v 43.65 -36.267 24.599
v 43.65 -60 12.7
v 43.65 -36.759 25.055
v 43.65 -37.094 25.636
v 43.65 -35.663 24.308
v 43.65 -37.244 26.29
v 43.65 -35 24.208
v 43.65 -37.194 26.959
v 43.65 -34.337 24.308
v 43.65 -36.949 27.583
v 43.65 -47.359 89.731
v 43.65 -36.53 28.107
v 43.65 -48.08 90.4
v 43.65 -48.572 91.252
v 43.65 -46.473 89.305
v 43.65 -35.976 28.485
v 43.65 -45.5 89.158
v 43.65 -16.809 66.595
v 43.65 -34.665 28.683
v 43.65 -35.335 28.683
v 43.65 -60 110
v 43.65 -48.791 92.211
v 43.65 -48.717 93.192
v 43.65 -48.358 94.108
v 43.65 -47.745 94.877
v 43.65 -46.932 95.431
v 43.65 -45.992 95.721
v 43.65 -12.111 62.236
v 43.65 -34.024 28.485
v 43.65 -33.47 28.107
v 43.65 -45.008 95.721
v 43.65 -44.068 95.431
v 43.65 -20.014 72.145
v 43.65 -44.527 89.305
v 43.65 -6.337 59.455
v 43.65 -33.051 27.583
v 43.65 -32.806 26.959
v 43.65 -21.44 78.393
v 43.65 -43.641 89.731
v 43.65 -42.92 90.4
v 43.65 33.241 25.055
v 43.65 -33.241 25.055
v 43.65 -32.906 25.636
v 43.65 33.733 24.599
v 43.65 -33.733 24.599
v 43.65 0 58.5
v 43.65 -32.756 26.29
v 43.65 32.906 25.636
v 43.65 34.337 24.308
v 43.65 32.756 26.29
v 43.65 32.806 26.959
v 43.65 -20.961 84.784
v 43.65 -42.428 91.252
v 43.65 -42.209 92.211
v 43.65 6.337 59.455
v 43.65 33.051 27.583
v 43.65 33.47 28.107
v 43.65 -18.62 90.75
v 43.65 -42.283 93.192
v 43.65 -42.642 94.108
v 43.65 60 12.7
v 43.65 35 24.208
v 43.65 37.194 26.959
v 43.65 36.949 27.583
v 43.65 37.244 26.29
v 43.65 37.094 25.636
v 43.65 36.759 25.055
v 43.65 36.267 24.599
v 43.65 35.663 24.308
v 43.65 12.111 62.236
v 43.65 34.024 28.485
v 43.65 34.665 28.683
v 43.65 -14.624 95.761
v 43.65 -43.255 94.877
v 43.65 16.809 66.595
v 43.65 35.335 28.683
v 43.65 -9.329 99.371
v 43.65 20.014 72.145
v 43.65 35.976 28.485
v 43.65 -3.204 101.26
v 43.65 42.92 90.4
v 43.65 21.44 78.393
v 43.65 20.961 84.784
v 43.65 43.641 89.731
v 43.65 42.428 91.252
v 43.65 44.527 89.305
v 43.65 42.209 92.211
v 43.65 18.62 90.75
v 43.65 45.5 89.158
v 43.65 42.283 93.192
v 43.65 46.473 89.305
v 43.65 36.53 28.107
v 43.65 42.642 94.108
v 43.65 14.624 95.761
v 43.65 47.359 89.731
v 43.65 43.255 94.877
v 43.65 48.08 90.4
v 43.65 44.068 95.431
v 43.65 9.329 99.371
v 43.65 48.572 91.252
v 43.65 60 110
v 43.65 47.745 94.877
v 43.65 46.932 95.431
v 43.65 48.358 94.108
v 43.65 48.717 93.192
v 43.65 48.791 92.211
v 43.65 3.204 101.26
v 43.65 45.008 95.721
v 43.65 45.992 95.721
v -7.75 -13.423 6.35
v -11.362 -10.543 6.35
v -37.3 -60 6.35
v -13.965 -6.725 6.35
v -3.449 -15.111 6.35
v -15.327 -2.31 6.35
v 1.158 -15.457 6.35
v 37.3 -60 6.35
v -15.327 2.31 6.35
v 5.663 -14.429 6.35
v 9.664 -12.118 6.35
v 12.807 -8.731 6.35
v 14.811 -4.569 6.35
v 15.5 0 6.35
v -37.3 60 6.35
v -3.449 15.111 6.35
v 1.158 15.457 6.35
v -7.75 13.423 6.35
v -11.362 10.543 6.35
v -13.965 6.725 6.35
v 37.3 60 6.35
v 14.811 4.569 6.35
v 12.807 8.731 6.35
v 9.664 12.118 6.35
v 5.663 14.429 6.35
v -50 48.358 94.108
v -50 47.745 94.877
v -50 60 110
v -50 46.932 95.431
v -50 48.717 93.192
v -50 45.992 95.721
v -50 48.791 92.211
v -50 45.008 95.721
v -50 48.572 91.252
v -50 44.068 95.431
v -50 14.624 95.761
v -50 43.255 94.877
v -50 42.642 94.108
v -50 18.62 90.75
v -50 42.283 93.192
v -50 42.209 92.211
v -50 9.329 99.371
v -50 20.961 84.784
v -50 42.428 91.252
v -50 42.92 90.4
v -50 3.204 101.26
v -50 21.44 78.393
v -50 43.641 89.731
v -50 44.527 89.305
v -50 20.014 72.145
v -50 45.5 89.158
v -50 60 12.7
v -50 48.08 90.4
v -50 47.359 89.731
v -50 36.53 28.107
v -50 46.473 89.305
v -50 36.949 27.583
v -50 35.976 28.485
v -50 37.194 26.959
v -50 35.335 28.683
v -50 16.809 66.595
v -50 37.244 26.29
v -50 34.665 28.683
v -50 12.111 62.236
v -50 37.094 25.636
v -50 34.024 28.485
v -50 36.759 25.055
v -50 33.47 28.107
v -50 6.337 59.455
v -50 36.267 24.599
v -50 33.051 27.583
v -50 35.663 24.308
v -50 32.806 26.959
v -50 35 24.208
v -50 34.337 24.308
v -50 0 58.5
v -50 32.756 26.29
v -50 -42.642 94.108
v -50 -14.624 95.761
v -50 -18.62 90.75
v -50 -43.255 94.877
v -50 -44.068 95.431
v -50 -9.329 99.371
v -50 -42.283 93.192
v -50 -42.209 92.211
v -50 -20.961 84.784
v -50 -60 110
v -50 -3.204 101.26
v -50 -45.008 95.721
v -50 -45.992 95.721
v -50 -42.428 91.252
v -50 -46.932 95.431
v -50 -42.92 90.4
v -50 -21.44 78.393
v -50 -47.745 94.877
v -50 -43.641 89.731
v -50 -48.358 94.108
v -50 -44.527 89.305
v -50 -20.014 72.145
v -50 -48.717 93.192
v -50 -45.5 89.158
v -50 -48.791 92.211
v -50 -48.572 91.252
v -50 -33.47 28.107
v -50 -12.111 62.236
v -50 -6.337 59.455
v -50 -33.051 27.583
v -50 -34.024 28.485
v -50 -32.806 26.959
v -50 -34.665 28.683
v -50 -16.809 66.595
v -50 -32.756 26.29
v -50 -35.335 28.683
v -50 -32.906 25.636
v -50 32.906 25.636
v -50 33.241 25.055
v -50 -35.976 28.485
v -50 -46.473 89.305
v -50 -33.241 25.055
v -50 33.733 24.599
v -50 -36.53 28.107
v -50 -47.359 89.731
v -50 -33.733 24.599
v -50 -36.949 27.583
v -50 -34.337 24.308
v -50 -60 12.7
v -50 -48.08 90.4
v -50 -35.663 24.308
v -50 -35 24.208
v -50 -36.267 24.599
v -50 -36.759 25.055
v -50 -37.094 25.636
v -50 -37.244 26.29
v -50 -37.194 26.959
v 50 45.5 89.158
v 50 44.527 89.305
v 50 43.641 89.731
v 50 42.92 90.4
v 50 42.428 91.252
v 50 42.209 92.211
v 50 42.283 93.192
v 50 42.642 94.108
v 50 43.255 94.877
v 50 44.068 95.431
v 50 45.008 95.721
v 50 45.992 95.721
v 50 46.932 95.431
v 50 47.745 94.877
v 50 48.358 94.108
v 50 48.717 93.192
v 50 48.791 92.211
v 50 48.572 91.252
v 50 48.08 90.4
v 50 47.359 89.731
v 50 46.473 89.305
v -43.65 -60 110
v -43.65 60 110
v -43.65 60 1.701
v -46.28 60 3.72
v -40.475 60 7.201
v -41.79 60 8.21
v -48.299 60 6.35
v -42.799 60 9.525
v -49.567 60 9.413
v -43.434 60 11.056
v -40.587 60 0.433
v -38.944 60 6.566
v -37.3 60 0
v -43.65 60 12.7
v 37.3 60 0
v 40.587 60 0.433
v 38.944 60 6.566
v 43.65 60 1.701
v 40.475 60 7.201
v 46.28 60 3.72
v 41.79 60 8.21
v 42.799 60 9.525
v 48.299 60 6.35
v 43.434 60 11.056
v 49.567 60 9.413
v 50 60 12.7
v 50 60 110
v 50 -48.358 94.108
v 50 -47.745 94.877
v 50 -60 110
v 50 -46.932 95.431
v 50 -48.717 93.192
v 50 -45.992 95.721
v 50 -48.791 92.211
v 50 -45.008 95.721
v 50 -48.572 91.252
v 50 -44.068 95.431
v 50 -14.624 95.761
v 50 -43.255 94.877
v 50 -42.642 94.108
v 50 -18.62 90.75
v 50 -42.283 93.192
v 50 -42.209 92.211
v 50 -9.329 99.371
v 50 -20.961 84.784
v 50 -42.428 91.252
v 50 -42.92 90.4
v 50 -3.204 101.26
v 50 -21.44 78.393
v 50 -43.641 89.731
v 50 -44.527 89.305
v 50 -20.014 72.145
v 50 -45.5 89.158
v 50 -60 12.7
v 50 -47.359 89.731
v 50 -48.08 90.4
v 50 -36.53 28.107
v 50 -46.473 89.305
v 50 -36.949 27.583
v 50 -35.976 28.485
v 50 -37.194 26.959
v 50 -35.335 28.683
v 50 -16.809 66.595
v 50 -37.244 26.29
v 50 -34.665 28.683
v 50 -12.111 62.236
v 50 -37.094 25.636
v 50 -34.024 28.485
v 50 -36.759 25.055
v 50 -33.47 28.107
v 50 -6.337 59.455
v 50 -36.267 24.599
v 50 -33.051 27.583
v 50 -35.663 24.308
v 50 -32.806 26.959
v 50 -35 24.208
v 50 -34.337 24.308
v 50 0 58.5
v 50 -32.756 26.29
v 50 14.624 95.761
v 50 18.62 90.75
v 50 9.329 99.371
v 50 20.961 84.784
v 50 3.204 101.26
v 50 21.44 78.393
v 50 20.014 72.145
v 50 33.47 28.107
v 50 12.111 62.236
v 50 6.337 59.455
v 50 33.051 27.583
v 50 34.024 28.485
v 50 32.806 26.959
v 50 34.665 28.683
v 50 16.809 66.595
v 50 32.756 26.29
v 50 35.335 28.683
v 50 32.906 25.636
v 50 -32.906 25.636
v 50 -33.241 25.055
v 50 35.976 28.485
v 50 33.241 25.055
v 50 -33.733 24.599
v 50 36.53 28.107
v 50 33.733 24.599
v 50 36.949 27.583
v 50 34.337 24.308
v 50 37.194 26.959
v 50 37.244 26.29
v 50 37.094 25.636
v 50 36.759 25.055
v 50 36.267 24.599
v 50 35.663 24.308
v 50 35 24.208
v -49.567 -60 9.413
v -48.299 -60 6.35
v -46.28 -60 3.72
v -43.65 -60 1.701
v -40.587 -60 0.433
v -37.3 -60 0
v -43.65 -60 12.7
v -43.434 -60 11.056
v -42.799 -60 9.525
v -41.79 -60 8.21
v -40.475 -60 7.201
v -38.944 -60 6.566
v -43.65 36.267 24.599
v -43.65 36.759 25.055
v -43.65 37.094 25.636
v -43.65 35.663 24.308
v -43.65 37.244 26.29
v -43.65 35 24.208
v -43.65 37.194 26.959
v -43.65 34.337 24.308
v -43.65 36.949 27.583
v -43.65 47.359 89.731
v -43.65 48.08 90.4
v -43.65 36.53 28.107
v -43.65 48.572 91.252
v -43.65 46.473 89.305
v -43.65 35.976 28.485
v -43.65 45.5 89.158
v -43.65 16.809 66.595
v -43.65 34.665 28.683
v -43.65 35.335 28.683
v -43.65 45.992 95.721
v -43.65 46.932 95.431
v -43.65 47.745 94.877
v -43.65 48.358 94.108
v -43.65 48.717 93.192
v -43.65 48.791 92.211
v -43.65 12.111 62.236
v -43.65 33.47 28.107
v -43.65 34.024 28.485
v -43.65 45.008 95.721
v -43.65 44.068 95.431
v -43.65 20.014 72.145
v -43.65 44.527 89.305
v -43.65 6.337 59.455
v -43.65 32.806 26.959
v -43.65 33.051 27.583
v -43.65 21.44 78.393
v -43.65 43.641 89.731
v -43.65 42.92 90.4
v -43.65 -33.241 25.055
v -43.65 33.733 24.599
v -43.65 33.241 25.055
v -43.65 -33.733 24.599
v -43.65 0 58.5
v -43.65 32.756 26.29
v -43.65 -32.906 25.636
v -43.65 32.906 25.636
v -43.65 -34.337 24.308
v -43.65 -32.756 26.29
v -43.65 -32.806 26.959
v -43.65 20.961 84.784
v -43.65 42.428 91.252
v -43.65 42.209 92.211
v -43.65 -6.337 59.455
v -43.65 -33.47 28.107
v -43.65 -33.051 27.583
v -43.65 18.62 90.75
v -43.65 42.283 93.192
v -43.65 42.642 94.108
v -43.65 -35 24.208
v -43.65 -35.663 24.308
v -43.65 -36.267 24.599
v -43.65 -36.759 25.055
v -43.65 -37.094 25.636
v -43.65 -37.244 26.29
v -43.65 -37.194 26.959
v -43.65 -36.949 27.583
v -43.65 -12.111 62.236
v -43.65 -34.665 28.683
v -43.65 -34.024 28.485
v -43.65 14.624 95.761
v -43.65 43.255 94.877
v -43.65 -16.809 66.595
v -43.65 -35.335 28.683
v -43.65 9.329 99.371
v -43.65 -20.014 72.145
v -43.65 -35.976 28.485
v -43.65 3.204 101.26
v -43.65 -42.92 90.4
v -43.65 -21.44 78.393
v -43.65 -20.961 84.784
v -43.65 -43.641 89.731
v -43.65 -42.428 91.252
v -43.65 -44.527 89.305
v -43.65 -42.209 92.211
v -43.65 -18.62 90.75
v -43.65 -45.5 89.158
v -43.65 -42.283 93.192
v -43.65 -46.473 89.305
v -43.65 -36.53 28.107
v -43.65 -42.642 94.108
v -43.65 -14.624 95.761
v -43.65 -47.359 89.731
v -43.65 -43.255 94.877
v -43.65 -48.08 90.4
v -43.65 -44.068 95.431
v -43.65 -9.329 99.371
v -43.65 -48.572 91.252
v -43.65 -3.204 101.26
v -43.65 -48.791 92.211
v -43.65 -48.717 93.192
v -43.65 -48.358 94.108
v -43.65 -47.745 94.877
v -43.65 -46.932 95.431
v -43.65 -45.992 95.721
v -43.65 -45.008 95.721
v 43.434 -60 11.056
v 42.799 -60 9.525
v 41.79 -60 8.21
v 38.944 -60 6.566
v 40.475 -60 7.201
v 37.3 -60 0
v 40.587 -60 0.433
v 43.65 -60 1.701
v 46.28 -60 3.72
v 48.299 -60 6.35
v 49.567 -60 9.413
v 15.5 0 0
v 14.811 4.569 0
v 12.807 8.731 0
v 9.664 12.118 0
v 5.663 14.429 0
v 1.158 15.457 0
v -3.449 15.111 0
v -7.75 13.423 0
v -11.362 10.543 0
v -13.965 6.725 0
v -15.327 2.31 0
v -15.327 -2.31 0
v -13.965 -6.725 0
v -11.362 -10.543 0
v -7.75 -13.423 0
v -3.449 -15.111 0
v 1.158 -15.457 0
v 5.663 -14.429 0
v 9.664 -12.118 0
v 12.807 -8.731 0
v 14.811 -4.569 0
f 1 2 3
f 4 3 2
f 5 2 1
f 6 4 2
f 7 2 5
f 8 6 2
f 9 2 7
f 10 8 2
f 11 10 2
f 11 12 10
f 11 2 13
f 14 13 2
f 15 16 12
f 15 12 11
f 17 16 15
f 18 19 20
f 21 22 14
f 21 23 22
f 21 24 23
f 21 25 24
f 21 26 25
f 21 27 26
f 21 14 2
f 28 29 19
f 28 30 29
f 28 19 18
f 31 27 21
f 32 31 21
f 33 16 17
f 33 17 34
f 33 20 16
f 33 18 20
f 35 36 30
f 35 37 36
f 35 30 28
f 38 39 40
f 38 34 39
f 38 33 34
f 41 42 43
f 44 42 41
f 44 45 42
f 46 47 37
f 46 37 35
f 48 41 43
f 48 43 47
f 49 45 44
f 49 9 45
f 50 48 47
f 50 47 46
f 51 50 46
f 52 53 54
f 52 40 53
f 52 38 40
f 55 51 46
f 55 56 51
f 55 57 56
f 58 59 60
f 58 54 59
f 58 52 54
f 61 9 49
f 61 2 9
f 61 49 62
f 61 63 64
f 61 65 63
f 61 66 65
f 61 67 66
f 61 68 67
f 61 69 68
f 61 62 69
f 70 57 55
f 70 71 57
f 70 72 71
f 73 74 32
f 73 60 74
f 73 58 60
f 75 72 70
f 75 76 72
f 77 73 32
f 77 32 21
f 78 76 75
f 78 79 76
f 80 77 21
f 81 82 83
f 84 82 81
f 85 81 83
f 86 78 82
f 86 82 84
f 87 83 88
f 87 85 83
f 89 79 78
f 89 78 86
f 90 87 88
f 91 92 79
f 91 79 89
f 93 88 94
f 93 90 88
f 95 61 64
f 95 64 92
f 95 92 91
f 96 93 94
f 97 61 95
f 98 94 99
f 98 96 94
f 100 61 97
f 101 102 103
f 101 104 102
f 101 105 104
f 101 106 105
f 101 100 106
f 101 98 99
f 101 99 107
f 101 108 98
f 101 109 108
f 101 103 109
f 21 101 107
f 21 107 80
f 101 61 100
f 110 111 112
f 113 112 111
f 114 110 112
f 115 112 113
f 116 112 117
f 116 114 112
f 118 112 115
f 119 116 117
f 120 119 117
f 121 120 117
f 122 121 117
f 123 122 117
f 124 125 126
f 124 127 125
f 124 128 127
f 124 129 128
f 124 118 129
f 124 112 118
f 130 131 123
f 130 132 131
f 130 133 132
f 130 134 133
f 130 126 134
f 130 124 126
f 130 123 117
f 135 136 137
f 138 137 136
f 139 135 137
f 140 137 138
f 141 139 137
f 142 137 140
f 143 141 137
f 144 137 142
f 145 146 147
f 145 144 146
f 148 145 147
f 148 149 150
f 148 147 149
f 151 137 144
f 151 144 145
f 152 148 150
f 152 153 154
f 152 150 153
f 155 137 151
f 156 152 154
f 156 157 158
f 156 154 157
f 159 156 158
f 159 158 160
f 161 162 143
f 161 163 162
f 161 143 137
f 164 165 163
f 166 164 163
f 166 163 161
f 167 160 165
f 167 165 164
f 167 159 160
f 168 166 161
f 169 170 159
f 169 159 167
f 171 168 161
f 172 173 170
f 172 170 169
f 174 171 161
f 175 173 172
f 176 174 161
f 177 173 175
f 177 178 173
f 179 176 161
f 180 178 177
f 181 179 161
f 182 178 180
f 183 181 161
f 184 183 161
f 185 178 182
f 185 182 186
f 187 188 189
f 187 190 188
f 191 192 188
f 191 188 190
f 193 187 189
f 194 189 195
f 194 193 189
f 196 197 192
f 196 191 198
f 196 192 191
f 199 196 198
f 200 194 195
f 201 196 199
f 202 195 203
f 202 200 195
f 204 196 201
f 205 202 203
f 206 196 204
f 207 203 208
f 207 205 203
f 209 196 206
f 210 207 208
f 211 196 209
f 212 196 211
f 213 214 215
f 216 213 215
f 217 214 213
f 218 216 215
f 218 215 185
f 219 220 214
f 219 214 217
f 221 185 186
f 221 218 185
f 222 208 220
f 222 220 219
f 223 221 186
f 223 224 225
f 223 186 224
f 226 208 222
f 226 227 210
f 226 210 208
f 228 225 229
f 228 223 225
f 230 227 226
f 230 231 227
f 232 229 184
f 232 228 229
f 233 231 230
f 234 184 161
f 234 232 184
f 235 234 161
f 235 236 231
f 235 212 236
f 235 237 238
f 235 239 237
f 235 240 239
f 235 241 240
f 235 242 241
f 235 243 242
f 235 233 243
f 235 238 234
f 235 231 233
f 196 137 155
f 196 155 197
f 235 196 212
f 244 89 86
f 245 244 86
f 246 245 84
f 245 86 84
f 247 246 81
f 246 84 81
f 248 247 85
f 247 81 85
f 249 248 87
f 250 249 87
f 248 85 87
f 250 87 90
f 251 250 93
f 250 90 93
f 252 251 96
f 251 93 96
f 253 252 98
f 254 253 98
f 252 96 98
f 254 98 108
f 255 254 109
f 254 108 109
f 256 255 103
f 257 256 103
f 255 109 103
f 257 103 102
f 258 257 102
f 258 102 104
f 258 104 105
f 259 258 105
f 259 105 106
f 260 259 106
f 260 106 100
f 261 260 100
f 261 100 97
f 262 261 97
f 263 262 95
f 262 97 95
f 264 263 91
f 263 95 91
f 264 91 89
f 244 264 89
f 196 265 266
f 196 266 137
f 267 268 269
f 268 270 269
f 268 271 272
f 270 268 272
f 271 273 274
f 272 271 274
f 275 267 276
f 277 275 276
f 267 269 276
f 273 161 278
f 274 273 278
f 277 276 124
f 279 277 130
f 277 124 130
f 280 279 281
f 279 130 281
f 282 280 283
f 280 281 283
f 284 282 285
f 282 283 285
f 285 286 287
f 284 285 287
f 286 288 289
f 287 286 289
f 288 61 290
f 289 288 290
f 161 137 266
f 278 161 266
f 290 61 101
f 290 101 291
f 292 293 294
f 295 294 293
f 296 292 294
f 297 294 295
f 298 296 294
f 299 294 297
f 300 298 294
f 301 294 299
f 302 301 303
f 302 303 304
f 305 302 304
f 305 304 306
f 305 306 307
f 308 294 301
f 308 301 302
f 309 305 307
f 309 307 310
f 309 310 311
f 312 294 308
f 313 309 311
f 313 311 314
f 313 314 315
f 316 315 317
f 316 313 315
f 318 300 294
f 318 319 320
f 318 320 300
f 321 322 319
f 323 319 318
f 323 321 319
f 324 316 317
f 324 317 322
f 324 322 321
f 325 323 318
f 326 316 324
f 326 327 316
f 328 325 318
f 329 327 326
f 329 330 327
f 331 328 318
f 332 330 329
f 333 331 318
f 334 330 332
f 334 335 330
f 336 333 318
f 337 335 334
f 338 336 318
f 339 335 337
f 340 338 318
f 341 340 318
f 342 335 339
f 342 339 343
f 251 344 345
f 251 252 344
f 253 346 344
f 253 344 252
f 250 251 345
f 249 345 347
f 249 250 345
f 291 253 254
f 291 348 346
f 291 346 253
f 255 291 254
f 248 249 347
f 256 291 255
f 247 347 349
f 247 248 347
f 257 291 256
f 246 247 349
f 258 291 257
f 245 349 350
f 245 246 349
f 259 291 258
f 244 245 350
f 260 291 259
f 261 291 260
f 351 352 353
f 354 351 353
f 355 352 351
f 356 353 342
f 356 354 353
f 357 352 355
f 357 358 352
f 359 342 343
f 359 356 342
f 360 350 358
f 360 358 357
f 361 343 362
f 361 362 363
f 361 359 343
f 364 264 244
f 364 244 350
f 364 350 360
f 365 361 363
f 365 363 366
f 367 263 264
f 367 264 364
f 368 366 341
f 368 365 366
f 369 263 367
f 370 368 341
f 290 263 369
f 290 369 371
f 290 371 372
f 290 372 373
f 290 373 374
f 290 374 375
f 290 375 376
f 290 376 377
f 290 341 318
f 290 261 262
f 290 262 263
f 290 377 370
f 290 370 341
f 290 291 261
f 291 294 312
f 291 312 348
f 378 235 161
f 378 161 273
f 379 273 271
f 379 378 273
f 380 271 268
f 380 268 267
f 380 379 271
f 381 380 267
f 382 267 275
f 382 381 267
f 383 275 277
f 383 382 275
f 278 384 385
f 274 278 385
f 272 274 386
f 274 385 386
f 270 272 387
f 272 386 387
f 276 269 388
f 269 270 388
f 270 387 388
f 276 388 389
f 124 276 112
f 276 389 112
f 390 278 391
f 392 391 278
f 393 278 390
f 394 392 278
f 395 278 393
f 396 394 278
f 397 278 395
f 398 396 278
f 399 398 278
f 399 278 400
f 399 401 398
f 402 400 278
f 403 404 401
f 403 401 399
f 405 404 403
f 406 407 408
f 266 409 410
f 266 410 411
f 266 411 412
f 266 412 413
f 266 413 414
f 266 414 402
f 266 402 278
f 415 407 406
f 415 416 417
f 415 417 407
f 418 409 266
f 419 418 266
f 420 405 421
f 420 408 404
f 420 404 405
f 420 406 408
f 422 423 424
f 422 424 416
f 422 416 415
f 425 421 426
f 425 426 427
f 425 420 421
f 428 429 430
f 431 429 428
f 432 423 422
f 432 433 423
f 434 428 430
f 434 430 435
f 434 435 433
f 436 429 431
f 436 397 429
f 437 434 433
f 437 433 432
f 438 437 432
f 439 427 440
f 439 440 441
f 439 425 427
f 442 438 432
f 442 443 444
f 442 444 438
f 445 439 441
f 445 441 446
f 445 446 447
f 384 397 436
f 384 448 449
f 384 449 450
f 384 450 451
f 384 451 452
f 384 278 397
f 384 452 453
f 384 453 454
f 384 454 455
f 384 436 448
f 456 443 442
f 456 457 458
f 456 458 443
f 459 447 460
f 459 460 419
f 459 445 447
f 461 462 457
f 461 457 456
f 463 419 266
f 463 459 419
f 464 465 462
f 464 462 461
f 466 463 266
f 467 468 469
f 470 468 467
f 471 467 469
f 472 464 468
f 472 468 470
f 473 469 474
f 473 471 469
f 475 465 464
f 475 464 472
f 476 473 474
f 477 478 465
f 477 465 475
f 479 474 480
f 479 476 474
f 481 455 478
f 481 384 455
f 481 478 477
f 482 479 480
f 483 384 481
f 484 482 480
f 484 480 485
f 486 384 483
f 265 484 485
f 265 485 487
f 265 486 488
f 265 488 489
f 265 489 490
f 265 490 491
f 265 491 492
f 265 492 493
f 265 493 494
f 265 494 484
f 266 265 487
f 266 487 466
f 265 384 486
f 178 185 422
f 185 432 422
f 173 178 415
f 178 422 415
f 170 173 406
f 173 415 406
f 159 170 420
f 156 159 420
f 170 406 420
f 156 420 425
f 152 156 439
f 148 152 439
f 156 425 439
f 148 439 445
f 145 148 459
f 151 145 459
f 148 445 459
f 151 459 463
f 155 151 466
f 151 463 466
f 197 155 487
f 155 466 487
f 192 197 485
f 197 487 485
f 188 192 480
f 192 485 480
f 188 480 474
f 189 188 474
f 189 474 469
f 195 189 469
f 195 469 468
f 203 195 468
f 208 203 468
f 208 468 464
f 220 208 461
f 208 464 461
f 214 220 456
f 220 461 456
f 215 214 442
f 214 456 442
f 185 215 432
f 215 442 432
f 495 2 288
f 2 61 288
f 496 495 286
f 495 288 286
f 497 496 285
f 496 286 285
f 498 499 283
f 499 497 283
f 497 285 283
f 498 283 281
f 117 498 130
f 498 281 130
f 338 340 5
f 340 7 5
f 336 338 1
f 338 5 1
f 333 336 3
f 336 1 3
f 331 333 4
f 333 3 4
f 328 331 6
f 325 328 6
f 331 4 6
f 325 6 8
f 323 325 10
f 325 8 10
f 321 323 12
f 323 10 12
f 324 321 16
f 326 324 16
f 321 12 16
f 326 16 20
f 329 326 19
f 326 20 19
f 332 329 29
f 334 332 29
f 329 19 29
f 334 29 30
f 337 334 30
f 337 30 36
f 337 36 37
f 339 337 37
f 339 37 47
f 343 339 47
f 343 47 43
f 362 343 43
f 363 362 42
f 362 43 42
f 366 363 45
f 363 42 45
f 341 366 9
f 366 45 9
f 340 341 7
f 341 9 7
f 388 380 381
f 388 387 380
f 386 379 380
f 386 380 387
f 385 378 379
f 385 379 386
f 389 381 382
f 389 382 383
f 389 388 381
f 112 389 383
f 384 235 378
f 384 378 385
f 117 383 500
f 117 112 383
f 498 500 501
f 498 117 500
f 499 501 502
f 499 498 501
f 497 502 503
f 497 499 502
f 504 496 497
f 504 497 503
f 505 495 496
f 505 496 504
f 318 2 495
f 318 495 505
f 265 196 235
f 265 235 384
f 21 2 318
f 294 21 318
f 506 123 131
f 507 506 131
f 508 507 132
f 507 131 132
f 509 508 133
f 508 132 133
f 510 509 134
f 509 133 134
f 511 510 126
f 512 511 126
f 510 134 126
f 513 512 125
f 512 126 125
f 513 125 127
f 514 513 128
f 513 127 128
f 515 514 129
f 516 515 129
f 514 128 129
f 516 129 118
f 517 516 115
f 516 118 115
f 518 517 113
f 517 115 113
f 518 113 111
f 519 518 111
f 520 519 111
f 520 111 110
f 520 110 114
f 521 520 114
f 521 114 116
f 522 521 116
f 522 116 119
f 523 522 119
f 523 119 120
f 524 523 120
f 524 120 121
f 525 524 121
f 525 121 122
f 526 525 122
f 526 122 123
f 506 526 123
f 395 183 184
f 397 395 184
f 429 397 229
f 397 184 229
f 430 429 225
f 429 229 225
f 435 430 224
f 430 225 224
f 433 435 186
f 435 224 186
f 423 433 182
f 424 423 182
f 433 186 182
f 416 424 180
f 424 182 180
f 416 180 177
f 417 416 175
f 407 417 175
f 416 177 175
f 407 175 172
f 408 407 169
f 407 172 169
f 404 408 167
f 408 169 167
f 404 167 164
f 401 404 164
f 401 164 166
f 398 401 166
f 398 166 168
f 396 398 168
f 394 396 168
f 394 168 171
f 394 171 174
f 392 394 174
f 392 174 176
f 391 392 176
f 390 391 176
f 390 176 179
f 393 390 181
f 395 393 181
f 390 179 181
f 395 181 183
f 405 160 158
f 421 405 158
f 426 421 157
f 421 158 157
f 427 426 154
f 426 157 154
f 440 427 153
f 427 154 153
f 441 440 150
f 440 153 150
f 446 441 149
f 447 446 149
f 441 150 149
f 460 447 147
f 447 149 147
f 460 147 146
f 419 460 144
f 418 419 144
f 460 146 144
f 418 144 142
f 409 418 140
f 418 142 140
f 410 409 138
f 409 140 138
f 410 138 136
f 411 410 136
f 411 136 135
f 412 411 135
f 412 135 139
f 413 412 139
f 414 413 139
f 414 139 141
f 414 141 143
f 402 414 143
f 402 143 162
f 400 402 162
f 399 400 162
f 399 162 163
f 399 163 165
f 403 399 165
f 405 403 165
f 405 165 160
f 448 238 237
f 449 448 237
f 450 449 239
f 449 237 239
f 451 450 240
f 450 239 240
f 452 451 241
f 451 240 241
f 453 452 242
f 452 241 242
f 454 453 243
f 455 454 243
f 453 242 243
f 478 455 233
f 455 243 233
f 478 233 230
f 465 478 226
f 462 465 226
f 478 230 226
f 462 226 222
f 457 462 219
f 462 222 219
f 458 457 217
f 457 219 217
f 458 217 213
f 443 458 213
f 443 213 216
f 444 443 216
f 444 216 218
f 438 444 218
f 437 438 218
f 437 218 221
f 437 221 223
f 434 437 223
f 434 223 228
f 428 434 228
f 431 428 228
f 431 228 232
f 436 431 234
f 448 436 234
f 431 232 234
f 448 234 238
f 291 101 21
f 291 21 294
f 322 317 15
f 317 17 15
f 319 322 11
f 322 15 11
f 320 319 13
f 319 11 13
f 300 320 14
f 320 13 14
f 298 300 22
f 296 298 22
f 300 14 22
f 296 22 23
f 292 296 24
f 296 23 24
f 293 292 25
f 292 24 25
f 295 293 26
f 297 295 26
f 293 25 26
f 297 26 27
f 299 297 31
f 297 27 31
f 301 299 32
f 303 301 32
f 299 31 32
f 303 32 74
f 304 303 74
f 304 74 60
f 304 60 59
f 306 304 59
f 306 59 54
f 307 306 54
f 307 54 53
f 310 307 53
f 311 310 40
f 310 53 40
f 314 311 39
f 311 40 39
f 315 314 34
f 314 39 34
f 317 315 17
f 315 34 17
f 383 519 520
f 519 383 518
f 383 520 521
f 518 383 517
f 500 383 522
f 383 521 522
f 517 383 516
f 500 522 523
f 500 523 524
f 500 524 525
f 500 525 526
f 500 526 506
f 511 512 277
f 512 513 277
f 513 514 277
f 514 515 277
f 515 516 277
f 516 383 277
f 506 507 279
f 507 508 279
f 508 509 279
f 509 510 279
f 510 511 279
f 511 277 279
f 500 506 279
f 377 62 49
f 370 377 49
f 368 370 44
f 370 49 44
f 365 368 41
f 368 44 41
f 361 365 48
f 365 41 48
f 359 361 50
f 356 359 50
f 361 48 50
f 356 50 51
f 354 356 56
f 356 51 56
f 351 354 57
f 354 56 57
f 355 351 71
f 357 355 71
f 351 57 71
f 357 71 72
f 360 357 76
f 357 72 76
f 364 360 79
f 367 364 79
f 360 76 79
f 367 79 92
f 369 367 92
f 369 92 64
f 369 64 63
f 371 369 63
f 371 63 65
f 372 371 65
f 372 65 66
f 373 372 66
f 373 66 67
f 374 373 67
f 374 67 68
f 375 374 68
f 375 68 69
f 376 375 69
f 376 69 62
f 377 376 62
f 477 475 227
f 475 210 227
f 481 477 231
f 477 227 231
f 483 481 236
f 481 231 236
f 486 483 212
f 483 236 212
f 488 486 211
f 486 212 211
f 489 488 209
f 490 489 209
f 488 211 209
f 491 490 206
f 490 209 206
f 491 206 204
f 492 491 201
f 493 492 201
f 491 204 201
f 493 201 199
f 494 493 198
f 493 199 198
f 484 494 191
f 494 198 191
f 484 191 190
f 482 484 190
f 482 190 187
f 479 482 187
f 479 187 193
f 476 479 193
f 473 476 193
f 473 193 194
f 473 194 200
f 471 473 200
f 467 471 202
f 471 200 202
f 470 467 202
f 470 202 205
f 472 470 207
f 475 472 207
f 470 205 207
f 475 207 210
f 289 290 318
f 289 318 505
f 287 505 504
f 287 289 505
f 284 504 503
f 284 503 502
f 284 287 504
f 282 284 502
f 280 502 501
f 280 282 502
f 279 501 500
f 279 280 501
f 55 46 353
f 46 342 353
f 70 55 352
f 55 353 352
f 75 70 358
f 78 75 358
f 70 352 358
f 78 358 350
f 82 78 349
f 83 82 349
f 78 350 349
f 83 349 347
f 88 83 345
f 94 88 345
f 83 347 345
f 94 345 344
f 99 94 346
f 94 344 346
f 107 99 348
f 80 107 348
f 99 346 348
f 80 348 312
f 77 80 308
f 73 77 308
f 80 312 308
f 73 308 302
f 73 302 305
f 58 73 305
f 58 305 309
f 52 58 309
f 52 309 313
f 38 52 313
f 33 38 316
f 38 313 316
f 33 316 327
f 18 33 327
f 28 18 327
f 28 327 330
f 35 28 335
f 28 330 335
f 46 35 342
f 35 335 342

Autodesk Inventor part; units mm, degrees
ref_plane "YZ Plane" through (0, 0, 0) normal (1, 0, 0) x (0, 1, 0)
ref_plane "XZ Plane" through (0, 0, 0) normal (0, 1, 0) x (-1, 0, 0)
ref_plane "XY Plane" through (0, 0, 0) normal (0, 0, 1) x (1, 0, 0)
sketch "Sketch1" plane through (0, 0, 0) normal (0, 0, 1) x (1, 0, 0)
  line L0 (-50, -60) -> (50, -60)
  line L1 (50, -60) -> (50, 60)
  line L2 (50, 60) -> (-50, 60)
  line L3 (-50, 60) -> (-50, -60)
  line L4 (-50, -60) -> (50, 60) construction
  line L5 (50, -60) -> (-50, 60) construction
  point P0 (0, 0)
  dimension "d0" = 100
  dimension "d1" = 120
extrude "Plate1" add sketch "Sketch1" along normal blind 6.35
sketch "Sketch2" plane through (-43.65, -60, 0) normal (-1, 0, 0) x (0, -1, 0)
  line L0 (-120, 0) -> (0, 0)
  line L1 (0, 0) -> (0, 110)
  line L2 (0, 110) -> (-120, 110)
  line L3 (-120, 110) -> (-120, 0)
edge flange "Flange1" height 110 angle 90 thickness 6.35 bend radius 6.35 thickness toward (-1, 0, 0) relief tear relief width 6.35 relief depth 3.175 corner gap 6.35 corner form 0 edges at (-50, 0, 6.35) (50, 0, 6.35) wall of the first edge with corners at (-43.65, 60, 0) (-43.65, -60, 0) (-43.65, -60, 110) (-43.65, 60, 110)
bend "Bend1"
corner "Corner1"
sketch "Sketch3" plane through (50, -60, 110) normal (1, 0, 0) x (0, 0, -1)
  circle A0 centre (30, 60) radius 21.082 construction
  circle A1 centre (30, 60) radius 21.5
  point P0 (110, 60)
  dimension "d13" = 42.164
  dimension "d14" = 43
  dimension "d15" = 80
extrude "Cut1" cut sketch "Sketch3" against normal through all
sketch "Sketch4" plane through (0, 0, 6.35) normal (0, 0, 1) x (1, 0, 0)
  circle A0 centre (0, 0) radius 15.5
  dimension "d18" = 31
extrude "Cut2" cut sketch "Sketch4" against normal blind 6.35
sketch "Sketch5" plane through (50, -60, 110) normal (1, 0, 0) x (0, 0, -1)
  circle A0 centre (30, 60) radius 21.5 projected
  line L0 (97.3, 0) -> (97.3, 120) projected
  line L1 (0, 120) -> (97.3, 120) projected
  line L2 (0, 0) -> (0, 120) projected
  line L3 (97.3, 0) -> (0, 0) projected
  line L4 (0, 120) -> (97.3, 120) construction
  line L5 (97.3, 0) -> (0, 0) construction
  line L6 (17.542, 105.5) -> (17.542, 14.5) construction
  line L7 (0, 0) -> (0, 120) construction
  point P0 (110, 60)
  point P1 (0, 60)
  point P2 (17.542, 60)
  dimension "d38" = 17.542
  dimension "d39" = 45.5
hole "Hole1" at (50, -45.5, 92.458) at (50, 45.5, 92.458) direction (-1, 0, 0) diameter 6.6 end through all clearance for "Flat Head Machine Screw" size "M6" standard "Ansi Metric M Profile"
sketch "Sketch6" plane through (50, -60, 110) normal (1, 0, 0) x (0, 0, -1)
  circle A0 centre (17.542, 14.5) radius 3.3 projected
  circle A1 centre (17.542, 105.5) radius 3.3 projected
  circle A2 centre (30, 60) radius 21.5 projected
  line L0 (97.3, 0) -> (97.3, 120) projected
  line L1 (0, 120) -> (97.3, 120) projected
  line L2 (0, 0) -> (0, 120) projected
  line L3 (97.3, 0) -> (0, 0) projected
  line L4 (83.542, 25) -> (83.542, 95) construction
  point P0 (110, 60)
  point P1 (83.542, 60)
  dimension "d29" = 70
  dimension "d30" = 83.542
hole "Hole2" at (50, -35, 26.458) at (50, 35, 26.458) direction (-1, 0, 0) diameter 4.5 end through all clearance for "Flat Head Machine Screw" size "M4" standard "Ansi Metric M Profile"
equation "\"d16\" = Thickness"
equation "\"d19\" = Thickness"
equation "\"d27\" = Thickness"
equation "\"d36\" = Thickness"
equation "\"d2\" = Thickness"
equation "\"d3\" = BendReliefWidth"
equation "\"d4\" = BendReliefDepth"
equation "\"d5\" = MinimumRemnant"
equation "\"d6\" = TransitionRadius"
equation "\"d9\" = BendRadius"
equation "\"d10\" = CornerReliefSize"
equation "\"d11\" = GapSize"
equation "\"d12\" = JacobiRadiusSize"
equation "\"BendRadius\" = Thickness"
equation "\"BendReliefWidth\" = Thickness"
equation "\"BendReliefDepth\" = 0.5 * Thickness"
equation "\"CornerReliefSize\" = 4 * Thickness"
equation "\"MinimumRemnant\" = 2 * Thickness"
equation "\"TransitionRadius\" = BendRadius"
equation "\"JacobiRadiusSize\" = BendRadius"
equation "\"GapSize\" = Thickness"
equation "\"Thickness\" = 6.35"
properties part number "Ground_Tracker_Bearing" material "UHMW, White"
